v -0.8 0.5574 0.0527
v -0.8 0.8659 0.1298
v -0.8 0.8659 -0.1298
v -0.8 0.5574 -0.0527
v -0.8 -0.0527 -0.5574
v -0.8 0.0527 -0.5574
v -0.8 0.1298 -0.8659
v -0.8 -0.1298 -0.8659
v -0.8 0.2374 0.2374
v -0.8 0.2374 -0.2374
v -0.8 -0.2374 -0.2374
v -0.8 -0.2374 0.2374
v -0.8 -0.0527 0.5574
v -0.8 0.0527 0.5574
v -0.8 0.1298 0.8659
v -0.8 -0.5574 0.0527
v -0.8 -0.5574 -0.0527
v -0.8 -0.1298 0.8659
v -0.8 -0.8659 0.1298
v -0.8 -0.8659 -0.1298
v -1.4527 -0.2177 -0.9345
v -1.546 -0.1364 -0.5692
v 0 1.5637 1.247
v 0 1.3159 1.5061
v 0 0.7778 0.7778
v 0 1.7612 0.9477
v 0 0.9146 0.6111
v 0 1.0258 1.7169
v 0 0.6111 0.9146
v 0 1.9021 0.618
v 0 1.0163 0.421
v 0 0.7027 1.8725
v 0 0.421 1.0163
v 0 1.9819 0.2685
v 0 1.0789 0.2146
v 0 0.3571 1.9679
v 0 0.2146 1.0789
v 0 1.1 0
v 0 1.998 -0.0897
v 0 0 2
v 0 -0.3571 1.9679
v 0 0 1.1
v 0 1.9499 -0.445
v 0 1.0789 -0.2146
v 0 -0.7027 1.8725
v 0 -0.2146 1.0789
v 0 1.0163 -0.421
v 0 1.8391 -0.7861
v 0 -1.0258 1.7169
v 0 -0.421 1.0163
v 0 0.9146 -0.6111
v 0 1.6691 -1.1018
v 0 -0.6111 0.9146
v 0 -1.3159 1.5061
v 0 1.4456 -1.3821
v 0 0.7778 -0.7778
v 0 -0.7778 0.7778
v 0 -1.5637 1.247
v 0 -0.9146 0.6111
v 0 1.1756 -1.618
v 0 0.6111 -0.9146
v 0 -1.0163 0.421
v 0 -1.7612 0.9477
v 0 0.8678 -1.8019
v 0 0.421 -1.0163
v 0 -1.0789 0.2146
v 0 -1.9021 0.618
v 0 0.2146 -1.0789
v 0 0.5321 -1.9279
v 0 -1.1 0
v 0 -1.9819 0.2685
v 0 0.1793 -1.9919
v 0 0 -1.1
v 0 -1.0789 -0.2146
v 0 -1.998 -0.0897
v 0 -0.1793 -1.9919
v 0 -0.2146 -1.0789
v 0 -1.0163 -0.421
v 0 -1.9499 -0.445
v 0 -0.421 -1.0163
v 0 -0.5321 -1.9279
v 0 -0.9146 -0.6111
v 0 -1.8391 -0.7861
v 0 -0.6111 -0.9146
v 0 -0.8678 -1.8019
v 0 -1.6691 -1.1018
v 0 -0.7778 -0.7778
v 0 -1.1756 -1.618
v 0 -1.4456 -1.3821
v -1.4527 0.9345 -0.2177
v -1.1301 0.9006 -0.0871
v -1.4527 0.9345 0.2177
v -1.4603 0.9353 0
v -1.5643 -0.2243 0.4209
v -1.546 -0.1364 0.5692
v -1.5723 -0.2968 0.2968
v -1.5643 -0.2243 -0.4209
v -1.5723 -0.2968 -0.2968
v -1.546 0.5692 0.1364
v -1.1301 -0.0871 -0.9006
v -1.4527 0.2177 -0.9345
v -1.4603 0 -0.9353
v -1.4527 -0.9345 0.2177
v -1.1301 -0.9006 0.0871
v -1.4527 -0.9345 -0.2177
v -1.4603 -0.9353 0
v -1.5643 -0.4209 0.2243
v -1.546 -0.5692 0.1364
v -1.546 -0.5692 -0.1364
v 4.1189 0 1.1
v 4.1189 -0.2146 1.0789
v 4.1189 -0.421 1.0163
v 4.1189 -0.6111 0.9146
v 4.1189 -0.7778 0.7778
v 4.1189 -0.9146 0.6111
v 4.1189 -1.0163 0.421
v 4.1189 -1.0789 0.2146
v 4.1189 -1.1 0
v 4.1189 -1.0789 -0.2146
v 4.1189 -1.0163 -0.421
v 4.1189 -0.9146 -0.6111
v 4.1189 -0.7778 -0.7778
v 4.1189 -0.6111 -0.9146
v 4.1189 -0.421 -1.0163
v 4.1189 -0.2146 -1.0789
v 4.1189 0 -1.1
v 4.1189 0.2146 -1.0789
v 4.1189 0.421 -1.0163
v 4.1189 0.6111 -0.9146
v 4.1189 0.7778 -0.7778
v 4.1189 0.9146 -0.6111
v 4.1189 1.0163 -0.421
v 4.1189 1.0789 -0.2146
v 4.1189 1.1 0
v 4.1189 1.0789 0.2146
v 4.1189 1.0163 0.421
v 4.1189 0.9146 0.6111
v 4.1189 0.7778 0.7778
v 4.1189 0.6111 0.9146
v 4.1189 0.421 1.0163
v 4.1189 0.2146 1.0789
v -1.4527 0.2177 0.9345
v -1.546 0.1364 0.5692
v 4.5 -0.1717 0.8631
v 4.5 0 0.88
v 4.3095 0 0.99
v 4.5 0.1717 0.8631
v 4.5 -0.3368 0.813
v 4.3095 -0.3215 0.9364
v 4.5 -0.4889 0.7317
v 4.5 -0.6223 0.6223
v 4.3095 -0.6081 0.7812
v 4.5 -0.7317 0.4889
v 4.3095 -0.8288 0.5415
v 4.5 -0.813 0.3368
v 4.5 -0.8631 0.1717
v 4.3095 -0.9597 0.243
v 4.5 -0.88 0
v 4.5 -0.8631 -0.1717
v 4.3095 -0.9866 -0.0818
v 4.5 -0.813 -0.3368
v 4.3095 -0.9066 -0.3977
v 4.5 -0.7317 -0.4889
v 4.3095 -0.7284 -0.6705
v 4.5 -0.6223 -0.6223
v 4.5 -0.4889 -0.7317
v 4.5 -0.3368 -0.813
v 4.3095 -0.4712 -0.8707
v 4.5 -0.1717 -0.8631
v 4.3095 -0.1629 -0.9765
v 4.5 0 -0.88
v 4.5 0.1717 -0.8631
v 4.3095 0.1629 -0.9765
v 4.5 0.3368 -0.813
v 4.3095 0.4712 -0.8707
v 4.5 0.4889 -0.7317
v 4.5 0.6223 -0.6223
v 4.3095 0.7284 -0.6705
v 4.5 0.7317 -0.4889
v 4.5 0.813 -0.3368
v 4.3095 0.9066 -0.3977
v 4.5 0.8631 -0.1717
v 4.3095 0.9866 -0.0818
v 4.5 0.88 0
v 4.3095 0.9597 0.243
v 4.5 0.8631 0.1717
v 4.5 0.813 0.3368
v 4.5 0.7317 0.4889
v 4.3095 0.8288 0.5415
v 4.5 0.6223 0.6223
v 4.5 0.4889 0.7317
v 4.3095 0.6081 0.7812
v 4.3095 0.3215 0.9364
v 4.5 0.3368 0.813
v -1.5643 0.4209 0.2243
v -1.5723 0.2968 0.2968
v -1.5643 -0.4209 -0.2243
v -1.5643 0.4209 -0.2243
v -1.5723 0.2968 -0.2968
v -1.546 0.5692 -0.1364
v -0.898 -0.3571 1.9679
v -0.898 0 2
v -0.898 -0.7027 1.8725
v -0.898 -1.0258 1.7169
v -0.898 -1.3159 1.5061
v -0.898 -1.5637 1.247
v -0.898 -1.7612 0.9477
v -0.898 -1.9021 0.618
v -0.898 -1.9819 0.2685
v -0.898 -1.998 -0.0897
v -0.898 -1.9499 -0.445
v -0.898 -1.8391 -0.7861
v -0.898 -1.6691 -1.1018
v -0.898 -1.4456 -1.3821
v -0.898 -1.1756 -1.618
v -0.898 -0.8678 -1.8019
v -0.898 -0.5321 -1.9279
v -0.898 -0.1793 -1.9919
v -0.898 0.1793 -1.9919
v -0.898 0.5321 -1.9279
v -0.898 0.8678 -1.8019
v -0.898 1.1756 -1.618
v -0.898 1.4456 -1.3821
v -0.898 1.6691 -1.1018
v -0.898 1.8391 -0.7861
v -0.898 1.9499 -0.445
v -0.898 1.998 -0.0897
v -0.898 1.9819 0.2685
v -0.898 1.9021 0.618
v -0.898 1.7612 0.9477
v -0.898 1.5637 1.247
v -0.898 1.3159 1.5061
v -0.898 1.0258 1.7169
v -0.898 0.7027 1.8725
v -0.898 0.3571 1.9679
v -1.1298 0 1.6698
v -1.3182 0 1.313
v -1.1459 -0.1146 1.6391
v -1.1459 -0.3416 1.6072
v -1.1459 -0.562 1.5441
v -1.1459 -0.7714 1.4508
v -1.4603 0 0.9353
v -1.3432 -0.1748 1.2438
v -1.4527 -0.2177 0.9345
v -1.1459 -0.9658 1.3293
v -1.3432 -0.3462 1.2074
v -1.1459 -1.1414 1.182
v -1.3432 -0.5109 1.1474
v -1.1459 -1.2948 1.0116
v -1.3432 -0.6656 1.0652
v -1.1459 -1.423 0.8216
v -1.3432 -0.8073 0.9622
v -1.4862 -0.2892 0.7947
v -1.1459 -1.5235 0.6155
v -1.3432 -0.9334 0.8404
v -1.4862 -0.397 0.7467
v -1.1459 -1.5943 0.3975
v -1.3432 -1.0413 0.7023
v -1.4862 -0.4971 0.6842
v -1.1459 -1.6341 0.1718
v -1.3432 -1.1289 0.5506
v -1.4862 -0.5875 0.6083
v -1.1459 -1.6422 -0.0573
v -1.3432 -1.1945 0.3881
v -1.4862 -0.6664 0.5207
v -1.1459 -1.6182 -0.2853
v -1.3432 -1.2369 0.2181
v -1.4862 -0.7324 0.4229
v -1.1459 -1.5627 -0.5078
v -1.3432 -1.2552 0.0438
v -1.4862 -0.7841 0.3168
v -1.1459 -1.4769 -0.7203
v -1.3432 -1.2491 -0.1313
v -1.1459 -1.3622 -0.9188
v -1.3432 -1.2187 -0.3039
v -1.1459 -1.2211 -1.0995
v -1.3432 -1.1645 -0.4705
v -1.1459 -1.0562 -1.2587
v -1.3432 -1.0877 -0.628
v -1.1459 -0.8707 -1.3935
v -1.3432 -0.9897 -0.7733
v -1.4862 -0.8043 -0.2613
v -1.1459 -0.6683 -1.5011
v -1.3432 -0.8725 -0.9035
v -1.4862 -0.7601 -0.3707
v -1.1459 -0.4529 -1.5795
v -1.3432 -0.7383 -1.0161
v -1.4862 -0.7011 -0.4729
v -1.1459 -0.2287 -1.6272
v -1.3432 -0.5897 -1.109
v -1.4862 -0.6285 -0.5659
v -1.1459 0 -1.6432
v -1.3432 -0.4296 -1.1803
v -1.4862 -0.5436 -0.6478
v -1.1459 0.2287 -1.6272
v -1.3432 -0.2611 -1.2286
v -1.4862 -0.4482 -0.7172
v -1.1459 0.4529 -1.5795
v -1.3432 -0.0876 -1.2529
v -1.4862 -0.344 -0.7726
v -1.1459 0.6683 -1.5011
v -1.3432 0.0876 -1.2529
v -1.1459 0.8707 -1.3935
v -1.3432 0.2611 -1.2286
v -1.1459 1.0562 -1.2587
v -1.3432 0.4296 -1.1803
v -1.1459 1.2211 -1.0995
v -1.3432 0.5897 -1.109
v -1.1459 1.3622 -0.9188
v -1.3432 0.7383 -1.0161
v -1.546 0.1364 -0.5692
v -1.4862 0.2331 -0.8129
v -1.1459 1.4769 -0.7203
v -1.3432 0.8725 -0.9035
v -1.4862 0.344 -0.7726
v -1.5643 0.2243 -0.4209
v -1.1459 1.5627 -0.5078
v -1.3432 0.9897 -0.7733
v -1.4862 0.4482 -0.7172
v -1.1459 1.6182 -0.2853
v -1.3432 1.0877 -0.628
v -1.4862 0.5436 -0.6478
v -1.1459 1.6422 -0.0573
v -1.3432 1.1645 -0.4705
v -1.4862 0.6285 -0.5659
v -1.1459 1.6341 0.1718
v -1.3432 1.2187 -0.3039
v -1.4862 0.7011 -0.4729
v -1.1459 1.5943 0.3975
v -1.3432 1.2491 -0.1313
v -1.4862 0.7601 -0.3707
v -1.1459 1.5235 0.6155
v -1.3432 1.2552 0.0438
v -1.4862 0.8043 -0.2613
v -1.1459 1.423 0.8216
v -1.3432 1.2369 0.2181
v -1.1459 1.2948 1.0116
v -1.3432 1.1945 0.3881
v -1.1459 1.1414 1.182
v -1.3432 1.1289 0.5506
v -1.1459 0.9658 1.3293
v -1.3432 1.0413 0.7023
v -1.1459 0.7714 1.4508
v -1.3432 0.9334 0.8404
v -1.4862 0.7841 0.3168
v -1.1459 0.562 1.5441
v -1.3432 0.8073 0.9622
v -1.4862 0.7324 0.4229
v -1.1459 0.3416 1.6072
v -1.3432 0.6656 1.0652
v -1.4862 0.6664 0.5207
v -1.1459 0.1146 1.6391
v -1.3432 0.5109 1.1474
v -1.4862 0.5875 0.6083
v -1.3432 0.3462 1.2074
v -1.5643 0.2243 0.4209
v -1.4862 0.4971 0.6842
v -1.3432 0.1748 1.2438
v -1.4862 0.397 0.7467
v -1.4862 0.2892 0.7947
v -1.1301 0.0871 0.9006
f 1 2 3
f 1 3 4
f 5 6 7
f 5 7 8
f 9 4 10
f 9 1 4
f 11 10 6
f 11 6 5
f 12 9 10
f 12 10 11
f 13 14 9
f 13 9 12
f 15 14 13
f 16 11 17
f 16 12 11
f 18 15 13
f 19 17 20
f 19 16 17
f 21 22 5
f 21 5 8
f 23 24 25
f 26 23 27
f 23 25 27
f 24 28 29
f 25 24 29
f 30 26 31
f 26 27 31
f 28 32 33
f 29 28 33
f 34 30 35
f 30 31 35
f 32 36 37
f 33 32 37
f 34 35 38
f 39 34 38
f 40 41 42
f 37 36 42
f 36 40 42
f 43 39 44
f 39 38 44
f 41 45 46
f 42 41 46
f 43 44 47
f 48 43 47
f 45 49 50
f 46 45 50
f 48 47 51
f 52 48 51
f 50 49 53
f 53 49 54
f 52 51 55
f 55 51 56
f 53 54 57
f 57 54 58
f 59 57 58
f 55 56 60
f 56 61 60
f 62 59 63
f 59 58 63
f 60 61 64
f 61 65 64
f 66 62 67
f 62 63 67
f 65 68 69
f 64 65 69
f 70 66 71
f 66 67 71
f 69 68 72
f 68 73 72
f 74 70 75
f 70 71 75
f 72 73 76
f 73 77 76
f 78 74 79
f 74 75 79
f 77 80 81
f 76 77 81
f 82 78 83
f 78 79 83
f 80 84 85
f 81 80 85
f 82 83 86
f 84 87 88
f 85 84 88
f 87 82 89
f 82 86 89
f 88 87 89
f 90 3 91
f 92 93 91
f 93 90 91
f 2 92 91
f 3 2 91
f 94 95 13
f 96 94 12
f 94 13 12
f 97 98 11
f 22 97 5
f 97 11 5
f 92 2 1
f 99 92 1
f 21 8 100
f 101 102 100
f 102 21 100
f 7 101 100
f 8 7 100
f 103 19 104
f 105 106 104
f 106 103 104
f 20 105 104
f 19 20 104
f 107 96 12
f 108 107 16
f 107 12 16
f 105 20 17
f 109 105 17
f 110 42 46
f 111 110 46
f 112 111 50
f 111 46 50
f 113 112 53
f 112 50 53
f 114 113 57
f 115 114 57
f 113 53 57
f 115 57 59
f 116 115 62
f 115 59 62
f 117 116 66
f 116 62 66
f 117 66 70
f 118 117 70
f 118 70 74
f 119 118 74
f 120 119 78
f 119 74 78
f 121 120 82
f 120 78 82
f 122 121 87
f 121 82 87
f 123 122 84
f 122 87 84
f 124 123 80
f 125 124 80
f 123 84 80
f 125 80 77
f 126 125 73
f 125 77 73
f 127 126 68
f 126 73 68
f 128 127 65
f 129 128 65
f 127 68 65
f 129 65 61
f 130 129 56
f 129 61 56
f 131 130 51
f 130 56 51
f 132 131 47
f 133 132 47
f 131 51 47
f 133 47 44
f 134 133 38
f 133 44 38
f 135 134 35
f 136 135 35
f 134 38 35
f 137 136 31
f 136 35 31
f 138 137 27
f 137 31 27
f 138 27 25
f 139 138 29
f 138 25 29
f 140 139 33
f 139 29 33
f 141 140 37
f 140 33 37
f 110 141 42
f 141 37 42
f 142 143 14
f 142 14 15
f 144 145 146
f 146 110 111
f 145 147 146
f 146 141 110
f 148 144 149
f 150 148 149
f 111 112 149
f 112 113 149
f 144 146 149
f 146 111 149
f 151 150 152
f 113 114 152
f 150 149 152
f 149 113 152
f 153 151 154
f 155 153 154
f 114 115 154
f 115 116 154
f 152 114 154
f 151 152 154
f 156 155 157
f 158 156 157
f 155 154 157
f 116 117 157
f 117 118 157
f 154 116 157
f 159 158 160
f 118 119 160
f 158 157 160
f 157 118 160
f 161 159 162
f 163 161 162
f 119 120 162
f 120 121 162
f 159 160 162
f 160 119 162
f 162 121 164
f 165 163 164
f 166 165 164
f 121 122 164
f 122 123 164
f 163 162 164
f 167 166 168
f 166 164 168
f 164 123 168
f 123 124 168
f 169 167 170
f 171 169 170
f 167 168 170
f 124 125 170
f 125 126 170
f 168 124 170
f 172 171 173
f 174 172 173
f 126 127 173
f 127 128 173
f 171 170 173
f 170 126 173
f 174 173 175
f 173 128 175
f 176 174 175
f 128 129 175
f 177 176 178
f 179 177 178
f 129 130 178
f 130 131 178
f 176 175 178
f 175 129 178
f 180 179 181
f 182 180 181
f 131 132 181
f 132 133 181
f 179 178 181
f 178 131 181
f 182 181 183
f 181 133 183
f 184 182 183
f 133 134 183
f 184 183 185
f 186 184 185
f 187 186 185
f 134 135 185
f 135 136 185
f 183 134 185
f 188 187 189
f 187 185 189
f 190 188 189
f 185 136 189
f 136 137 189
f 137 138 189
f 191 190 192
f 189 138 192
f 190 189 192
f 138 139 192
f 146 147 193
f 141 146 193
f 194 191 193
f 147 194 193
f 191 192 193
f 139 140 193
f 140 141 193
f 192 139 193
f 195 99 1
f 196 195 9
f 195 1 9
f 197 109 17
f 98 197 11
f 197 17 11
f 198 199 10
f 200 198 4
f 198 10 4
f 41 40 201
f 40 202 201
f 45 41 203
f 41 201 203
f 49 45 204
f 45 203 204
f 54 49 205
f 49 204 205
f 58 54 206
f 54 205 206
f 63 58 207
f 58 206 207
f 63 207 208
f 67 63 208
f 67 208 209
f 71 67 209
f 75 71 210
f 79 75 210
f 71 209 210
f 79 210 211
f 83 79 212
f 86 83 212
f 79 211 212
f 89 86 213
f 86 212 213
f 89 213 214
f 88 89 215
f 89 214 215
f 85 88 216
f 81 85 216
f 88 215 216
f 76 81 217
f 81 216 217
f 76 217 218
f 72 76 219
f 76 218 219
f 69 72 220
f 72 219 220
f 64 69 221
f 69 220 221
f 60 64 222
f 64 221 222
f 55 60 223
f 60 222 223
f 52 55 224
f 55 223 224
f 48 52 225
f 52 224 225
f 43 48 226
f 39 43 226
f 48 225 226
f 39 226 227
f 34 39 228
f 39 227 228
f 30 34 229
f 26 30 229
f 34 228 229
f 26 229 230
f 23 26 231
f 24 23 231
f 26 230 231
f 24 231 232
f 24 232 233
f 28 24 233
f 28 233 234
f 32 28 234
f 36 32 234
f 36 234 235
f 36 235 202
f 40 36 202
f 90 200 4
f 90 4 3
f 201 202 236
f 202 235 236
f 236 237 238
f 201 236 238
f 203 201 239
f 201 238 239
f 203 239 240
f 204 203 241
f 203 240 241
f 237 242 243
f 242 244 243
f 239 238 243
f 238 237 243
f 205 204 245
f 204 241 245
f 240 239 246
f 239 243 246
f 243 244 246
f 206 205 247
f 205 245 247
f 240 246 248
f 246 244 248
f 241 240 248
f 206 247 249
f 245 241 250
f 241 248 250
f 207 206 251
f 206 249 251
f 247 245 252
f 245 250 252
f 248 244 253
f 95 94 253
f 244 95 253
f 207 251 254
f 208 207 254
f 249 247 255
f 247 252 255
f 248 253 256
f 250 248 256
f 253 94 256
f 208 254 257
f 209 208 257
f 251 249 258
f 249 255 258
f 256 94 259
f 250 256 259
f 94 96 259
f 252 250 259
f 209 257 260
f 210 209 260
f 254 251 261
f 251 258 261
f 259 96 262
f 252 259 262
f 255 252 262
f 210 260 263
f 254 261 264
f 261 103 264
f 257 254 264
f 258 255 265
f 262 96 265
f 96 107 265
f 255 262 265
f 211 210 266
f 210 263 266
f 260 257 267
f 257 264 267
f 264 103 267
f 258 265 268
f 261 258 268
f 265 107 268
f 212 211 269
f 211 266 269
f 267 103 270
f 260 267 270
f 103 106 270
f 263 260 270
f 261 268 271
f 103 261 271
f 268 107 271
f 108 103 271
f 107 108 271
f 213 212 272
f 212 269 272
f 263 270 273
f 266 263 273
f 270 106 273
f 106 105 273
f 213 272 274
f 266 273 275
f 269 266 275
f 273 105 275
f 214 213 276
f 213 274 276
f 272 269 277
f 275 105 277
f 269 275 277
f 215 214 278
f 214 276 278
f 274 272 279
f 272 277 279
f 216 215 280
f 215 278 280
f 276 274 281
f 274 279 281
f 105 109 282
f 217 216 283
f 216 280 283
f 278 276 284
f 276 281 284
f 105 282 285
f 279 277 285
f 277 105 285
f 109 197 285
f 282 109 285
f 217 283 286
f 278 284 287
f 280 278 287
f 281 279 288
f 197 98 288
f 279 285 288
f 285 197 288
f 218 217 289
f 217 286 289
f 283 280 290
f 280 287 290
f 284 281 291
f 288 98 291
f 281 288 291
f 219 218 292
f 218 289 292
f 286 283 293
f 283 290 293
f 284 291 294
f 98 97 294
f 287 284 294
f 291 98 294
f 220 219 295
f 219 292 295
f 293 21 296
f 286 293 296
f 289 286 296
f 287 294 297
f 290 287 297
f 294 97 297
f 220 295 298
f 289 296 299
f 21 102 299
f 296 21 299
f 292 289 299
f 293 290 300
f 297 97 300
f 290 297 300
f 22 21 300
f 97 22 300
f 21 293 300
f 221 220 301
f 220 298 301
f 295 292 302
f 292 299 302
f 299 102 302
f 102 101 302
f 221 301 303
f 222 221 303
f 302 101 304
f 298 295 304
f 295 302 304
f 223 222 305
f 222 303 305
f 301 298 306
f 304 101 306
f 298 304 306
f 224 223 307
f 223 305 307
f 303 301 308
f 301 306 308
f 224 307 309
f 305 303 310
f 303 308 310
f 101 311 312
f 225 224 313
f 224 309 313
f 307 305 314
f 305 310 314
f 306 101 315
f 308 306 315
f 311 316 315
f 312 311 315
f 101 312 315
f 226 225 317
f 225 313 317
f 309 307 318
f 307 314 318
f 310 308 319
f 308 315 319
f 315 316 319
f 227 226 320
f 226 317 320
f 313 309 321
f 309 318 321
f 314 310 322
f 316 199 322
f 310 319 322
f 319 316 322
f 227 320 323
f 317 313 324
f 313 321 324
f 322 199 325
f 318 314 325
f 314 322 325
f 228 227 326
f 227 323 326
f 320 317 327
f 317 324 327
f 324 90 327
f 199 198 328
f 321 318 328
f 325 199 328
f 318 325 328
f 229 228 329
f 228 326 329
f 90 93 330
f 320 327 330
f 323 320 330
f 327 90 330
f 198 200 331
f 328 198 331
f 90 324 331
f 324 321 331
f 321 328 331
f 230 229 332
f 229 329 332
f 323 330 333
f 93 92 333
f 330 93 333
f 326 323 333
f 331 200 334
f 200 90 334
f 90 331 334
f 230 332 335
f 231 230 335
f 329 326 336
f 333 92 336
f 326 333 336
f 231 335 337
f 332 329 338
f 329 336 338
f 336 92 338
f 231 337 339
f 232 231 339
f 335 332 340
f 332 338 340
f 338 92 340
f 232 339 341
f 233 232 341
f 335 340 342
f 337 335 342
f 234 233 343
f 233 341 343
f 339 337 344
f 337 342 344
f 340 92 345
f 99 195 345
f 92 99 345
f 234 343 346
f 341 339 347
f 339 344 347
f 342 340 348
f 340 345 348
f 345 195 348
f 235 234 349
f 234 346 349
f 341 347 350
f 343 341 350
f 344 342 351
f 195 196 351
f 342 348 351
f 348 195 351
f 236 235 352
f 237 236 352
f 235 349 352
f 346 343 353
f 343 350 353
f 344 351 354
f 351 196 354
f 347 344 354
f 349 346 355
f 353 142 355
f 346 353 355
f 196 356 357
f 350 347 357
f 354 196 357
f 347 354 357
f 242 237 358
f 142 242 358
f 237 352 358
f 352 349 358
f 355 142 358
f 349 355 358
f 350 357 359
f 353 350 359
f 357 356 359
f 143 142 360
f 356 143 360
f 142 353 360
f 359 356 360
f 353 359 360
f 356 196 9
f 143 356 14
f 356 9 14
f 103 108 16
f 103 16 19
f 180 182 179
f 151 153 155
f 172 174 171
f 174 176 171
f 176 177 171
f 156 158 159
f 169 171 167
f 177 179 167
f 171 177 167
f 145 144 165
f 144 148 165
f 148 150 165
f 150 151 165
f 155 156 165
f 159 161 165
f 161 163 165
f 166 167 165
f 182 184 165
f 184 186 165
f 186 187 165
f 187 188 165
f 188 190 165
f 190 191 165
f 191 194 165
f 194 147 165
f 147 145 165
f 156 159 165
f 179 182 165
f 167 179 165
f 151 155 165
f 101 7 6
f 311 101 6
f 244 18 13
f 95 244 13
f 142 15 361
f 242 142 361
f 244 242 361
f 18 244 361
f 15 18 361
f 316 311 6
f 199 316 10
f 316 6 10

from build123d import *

# Parameters (mm, degrees)
CHAMFER1_SIZE      = 0.22
CHAMFER1_SIZE2     = 0.381051178
CUT_EXTRUDE1_DEPTH = 0.8
CUT_EXTRUDE1_TAPER = 6


with BuildPart() as part:
    # Sketch1 → Revolve1 (revolve)
    with BuildSketch(Plane.XY, mode=Mode.PRIVATE) as revolve1_sk:
        with BuildLine():
            Line((0, 2), (-0.897999199, 2))
            ThreePointArc((-0.897999199, 2), (-1.419403703, 1.059811908), (-1.6, 0))
            Line((-1.6, 0), (4.5, 0))
            Line((4.5, 0), (4.5, 1.1))
            Line((4.5, 1.1), (0, 1.1))
            Line((0, 1.1), (0, 2))
        make_face()
    revolve(revolve1_sk.sketch.rotate(Axis((0, 0, 0), (1, 0, 0)), 90), axis=Axis((0, 0, 0), (1, 0, 0)))

    # Chamfer1
    chamfer1_edges = [part.edges().sort_by_distance(p)[0] for p in [
        (4.5, 0, -1.1),
    ]]
    chamfer1_side = [part.faces().sort_by_distance(p)[0] for p in [
        (4.5, 0, 0),
    ]]
    chamfer(chamfer1_edges, length=CHAMFER1_SIZE, length2=CHAMFER1_SIZE2, reference=chamfer1_side[0])

    # Sketch3 → Cut-Extrude1 (cut)
    with BuildSketch(Plane(origin=(-1.6, 0, 0), x_dir=(0, 0, -1), z_dir=(1, 0, 0))):
        Polygon((-0.2375, 0.95), (-0.1425, 0.57), (-0.29897586, 0.29897586), (-0.57, 0.1425), (-0.95, 0.2375), (-0.95, -0.2375), (-0.57, -0.1425), (-0.29897586, -0.29897586), (-0.1425, -0.57), (-0.2375, -0.95), (0.2375, -0.95), (0.1425, -0.57), (0.29897586, -0.29897586), (0.57, -0.1425), (0.95, -0.2375), (0.95, 0.2375), (0.57, 0.1425), (0.29897586, 0.29897586), (0.1425, 0.57), (0.2375, 0.95), align=None)
    extrude(amount=CUT_EXTRUDE1_DEPTH, taper=CUT_EXTRUDE1_TAPER, mode=Mode.SUBTRACT)


solid = part.part
